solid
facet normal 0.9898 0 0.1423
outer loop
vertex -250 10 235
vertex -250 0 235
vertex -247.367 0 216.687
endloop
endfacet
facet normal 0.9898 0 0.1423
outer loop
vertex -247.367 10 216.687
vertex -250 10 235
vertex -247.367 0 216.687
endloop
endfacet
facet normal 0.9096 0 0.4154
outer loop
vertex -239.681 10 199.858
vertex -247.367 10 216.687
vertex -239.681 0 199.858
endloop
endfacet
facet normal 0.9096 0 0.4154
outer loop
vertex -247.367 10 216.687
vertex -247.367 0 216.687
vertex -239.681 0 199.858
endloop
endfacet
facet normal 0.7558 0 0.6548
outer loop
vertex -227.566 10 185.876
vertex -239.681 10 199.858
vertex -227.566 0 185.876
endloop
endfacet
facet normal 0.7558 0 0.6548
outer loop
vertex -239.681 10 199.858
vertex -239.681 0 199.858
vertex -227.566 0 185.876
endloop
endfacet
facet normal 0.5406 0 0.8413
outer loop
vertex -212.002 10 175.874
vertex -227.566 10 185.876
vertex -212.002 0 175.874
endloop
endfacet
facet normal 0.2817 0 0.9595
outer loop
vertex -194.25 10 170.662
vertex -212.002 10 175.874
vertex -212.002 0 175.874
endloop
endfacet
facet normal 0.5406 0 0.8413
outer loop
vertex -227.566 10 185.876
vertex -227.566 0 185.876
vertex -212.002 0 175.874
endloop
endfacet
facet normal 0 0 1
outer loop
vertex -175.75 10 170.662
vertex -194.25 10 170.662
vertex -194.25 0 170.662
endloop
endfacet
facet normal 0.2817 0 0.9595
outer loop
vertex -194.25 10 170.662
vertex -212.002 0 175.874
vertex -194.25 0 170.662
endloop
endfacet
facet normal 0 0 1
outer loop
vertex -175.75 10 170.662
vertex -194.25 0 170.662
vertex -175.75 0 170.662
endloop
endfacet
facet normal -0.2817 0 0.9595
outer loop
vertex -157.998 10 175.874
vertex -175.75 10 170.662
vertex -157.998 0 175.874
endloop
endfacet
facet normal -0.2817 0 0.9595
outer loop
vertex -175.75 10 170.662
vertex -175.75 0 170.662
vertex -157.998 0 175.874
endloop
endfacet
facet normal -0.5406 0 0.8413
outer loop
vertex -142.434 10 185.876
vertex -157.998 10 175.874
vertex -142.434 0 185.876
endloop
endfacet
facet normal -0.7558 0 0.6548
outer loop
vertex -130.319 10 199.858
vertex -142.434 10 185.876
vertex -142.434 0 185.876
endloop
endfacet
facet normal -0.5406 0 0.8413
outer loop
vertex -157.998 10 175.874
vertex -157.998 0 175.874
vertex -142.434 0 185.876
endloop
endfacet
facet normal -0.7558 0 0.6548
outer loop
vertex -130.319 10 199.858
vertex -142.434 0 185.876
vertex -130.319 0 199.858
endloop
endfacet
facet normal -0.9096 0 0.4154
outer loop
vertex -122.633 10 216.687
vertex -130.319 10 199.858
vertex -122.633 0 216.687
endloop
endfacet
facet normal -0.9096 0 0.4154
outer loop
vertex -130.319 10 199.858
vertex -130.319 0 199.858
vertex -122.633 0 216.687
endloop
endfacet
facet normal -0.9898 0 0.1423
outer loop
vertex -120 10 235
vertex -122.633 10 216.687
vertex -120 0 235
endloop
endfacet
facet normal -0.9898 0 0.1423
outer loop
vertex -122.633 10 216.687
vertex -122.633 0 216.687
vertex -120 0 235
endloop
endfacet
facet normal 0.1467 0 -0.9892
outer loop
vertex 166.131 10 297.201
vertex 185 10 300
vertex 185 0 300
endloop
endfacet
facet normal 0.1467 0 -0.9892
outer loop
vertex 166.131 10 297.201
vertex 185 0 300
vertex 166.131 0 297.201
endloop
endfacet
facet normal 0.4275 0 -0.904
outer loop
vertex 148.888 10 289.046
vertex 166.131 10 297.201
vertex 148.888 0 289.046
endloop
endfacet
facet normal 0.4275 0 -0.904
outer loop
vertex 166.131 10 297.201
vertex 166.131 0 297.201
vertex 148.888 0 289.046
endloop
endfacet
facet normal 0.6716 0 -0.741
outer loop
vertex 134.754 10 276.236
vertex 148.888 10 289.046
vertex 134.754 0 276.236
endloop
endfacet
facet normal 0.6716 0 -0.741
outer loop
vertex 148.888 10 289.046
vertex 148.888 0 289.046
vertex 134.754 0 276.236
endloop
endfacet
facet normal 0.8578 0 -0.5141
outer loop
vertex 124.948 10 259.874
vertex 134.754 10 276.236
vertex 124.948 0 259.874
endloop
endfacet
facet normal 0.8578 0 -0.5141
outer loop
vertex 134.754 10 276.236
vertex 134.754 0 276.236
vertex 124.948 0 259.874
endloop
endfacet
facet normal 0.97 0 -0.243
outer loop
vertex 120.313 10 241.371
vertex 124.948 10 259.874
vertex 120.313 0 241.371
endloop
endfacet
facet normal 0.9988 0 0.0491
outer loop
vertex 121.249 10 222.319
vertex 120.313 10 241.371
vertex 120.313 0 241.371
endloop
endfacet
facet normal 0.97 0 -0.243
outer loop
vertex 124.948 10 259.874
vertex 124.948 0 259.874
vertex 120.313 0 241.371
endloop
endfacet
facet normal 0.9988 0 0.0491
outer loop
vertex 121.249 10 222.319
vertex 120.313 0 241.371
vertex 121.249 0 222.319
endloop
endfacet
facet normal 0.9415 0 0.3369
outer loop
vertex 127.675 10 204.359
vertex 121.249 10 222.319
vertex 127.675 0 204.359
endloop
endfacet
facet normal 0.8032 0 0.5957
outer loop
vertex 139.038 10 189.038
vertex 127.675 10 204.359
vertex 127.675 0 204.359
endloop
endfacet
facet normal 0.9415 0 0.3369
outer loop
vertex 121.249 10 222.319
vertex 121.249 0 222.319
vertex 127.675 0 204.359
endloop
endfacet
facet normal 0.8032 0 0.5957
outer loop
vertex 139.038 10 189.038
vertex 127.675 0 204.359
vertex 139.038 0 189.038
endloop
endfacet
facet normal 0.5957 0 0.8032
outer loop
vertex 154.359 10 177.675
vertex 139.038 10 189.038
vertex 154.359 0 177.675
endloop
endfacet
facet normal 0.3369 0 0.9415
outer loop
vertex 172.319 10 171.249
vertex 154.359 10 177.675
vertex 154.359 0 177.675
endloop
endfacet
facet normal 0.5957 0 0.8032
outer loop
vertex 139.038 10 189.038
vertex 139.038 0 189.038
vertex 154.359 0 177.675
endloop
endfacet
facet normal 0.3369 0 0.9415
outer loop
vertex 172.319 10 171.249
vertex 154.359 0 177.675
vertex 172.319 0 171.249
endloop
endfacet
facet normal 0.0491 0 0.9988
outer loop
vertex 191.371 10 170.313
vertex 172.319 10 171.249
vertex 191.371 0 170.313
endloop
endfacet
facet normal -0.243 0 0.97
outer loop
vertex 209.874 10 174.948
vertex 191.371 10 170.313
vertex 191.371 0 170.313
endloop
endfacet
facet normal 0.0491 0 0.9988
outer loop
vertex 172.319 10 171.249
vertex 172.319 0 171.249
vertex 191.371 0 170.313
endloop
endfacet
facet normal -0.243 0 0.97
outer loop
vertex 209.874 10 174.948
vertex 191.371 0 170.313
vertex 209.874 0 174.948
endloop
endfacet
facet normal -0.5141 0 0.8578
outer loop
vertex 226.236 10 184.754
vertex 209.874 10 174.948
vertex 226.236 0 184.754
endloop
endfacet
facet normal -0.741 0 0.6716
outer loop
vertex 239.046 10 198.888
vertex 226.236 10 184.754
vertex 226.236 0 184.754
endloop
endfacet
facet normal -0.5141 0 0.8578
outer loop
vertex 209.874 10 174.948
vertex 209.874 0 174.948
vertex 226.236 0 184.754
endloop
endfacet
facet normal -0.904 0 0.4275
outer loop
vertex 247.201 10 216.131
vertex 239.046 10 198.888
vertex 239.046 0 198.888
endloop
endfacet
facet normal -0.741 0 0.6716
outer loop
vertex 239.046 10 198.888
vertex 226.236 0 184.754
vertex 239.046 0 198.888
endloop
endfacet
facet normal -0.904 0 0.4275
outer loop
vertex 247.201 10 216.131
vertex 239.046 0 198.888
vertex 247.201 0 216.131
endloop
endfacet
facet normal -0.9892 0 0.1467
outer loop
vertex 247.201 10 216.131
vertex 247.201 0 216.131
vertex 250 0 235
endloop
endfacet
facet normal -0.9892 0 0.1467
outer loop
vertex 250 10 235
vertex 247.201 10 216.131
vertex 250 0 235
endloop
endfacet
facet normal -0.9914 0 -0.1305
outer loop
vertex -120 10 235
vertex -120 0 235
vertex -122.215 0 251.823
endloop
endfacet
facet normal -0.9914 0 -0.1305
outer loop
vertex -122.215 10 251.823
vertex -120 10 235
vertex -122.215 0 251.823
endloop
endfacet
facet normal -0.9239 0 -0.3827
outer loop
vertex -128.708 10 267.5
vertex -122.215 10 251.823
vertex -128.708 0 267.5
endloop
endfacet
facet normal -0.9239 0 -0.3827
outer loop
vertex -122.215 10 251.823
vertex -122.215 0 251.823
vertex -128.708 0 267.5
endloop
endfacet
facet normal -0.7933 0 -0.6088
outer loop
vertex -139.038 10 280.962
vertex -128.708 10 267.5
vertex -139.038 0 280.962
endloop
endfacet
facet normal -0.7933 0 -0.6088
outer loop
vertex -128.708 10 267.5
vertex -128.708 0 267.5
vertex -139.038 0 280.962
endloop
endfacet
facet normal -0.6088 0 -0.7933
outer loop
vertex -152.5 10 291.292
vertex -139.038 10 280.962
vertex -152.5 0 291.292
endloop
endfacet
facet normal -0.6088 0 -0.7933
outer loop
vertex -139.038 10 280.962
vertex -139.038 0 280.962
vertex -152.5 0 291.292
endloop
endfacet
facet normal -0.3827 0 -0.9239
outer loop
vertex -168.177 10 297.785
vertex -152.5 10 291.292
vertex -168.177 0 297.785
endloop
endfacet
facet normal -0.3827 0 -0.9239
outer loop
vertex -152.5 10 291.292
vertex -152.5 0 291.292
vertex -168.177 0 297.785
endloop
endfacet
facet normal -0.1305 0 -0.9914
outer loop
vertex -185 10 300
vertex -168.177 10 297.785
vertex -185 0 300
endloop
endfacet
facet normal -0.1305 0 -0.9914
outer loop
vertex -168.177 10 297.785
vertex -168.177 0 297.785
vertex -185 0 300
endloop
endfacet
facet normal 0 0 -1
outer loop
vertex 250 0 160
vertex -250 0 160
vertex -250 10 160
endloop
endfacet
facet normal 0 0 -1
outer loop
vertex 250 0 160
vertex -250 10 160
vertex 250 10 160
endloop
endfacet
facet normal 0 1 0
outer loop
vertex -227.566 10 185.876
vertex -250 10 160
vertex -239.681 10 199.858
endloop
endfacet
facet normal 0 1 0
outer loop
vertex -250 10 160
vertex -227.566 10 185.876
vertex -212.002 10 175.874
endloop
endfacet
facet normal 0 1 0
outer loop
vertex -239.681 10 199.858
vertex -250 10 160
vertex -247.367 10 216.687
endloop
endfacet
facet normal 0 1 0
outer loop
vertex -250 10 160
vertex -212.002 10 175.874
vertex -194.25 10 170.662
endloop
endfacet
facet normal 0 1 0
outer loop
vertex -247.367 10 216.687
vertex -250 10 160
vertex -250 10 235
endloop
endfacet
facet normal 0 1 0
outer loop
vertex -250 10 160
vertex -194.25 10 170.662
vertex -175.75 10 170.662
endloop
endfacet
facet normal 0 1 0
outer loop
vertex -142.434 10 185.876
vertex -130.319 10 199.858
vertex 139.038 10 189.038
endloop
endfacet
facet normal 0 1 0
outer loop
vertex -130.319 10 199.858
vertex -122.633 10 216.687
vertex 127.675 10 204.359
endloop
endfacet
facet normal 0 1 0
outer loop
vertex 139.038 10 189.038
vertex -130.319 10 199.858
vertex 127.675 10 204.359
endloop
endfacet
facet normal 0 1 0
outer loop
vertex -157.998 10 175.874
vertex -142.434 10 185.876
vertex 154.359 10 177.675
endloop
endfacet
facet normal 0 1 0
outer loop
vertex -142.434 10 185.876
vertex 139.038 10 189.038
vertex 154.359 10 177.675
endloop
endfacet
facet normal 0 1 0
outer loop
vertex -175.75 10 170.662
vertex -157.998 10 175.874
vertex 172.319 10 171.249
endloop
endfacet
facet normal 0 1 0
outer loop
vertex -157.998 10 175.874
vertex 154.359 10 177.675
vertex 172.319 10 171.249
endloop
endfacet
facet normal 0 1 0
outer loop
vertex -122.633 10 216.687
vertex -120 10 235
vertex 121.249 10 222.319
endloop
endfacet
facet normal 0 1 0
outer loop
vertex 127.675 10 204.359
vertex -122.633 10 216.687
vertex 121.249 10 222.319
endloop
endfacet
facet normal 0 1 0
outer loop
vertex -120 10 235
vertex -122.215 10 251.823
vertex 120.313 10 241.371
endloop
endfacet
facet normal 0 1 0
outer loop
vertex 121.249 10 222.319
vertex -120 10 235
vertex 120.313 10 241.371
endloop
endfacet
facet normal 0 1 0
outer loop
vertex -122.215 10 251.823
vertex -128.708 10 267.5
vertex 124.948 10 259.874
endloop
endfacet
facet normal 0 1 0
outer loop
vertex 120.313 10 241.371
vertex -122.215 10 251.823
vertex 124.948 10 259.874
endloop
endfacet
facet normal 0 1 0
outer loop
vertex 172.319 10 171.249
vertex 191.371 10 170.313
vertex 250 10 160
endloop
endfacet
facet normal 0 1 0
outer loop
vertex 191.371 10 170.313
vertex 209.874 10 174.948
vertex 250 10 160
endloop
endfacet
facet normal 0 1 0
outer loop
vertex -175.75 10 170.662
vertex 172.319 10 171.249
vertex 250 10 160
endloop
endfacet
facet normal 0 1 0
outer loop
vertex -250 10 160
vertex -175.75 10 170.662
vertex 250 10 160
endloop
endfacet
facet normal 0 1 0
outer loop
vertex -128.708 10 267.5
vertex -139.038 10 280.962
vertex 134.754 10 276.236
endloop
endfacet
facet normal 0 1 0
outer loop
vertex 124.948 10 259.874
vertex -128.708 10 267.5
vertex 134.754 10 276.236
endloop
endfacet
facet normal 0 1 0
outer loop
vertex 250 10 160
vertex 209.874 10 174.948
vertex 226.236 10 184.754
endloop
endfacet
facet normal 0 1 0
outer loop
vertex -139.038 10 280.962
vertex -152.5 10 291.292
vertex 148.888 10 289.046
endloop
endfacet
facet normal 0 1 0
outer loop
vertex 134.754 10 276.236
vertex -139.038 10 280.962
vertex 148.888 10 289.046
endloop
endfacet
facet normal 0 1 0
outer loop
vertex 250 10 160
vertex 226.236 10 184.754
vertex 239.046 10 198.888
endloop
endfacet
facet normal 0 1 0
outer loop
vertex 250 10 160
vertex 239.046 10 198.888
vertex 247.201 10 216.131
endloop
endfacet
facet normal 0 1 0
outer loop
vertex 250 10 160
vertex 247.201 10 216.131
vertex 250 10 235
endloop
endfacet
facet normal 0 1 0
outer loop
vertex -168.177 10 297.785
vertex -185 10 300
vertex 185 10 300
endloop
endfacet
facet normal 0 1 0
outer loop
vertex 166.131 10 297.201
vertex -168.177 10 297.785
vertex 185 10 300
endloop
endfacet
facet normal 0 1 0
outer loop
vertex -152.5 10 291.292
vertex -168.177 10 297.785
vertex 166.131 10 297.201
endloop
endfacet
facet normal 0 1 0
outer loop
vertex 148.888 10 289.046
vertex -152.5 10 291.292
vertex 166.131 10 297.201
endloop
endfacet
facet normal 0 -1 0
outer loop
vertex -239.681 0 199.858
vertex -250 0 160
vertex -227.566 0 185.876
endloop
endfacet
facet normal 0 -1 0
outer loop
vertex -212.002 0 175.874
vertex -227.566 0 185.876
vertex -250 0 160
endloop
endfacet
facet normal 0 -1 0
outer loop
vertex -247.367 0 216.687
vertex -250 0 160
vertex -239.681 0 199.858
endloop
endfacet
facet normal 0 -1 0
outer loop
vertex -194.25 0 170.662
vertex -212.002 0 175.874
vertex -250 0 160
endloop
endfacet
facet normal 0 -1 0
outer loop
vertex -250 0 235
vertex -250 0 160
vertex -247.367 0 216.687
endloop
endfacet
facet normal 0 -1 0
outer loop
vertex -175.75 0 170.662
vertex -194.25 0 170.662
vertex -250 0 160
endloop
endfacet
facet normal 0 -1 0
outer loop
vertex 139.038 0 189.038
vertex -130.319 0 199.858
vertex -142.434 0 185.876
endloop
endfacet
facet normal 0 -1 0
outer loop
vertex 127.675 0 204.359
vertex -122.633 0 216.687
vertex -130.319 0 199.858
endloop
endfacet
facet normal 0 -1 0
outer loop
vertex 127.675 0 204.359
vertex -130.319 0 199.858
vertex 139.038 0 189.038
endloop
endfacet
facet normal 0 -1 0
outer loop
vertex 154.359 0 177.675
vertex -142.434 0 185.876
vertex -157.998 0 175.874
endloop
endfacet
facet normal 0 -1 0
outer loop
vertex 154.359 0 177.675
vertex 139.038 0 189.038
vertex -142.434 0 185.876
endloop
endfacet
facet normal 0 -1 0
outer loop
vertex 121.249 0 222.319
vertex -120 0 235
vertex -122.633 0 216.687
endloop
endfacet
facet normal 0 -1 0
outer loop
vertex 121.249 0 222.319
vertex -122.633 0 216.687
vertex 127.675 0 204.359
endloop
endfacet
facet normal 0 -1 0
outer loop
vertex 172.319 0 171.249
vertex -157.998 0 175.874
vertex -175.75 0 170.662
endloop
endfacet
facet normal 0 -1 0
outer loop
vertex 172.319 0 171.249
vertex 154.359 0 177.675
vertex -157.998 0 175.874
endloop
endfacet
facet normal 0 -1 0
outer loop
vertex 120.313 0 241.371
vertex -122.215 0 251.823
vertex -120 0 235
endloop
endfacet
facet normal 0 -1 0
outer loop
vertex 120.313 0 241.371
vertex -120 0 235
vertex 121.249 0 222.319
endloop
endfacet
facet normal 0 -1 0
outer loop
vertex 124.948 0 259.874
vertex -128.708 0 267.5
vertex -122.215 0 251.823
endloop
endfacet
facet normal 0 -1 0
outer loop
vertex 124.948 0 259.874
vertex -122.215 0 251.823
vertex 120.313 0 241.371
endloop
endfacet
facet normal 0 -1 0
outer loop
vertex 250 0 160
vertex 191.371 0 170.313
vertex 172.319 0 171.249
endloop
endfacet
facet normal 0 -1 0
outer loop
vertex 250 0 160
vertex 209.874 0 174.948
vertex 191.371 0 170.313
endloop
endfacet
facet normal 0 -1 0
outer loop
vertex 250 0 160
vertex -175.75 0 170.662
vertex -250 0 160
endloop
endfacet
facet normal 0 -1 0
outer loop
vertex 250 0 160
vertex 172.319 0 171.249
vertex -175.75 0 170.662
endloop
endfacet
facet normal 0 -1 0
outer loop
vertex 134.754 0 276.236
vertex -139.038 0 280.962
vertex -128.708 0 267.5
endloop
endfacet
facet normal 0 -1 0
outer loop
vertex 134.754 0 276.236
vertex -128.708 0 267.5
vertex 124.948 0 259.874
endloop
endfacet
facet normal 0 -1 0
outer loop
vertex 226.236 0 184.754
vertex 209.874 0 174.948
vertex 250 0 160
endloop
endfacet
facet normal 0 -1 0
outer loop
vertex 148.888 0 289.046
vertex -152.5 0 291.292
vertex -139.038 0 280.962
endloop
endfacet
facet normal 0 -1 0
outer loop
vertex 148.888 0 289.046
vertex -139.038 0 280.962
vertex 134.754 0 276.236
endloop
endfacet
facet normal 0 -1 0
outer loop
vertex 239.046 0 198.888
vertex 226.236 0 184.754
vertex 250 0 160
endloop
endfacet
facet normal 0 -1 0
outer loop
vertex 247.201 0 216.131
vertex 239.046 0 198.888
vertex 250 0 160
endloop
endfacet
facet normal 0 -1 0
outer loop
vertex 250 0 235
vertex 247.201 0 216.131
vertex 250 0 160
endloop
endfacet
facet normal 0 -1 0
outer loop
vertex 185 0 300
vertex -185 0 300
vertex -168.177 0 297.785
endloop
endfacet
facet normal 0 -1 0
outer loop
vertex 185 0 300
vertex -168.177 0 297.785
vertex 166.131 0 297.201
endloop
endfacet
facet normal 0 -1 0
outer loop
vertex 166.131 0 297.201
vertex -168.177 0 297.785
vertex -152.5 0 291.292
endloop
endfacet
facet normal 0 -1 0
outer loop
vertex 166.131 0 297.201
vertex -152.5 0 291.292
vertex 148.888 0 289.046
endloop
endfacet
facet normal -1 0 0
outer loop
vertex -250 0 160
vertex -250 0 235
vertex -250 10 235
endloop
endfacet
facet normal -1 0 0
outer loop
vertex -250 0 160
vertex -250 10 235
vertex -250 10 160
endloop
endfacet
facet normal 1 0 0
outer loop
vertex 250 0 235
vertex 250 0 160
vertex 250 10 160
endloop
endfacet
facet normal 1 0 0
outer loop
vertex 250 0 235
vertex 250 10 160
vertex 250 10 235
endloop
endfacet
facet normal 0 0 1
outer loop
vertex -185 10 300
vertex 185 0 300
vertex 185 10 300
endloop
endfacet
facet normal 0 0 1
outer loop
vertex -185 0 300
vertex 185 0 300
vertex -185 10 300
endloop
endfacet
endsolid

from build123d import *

# Parameters (mm, degrees)
F1_DEPTH = 10
F2_DEPTH = 25
F3_DEPTH = 25


with BuildPart() as f1:
    # F0 (on Front) → F1 (new body)
    with BuildSketch(Plane.XZ):
        with BuildLine():
            ThreePointArc((-120, 235), (-139.038059, 280.961941), (-185, 300))
            ThreePointArc((-185, 300), (-230.961941, 280.961941), (-250, 235))
            ThreePointArc((-250, 235), (-185, 170), (-120, 235))
        make_face()
        with BuildLine():
            Line((0, 300), (-185, 300))
            ThreePointArc((-185, 300), (-139.038059, 280.961941), (-120, 235))
            ThreePointArc((-120, 235), (-185, 170), (-250, 235))
            Line((-250, 235), (-250, 160))
            Line((-250, 160), (0, 160))
            Line((0, 160), (0, 300))
        make_face()
        with BuildLine():
            Line((185, 300), (0, 300))
            Line((0, 300), (0, 160))
            Line((0, 160), (250, 160))
            Line((250, 160), (250, 235))
            ThreePointArc((250, 235), (139.038059, 189.038059), (185, 300))
        make_face()
        with BuildLine():
            ThreePointArc((250, 235), (230.961941, 280.961941), (185, 300))
            ThreePointArc((185, 300), (139.038059, 189.038059), (250, 235))
        make_face()
    extrude(amount=-F1_DEPTH)

    # F0 (on Front) → F2 (cut)
    with BuildSketch(Plane.XZ):
        with BuildLine():
            ThreePointArc((-120, 235), (-139.038059, 280.961941), (-185, 300))
            ThreePointArc((-185, 300), (-230.961941, 280.961941), (-250, 235))
            ThreePointArc((-250, 235), (-185, 170), (-120, 235))
        make_face()
    extrude(amount=-F2_DEPTH, mode=Mode.SUBTRACT)

    # F0 (on Front) → F3 (cut)
    with BuildSketch(Plane.XZ):
        with BuildLine():
            ThreePointArc((250, 235), (230.961941, 280.961941), (185, 300))
            ThreePointArc((185, 300), (139.038059, 189.038059), (250, 235))
        make_face()
    extrude(amount=-F3_DEPTH, mode=Mode.SUBTRACT)


solid = f1.part
